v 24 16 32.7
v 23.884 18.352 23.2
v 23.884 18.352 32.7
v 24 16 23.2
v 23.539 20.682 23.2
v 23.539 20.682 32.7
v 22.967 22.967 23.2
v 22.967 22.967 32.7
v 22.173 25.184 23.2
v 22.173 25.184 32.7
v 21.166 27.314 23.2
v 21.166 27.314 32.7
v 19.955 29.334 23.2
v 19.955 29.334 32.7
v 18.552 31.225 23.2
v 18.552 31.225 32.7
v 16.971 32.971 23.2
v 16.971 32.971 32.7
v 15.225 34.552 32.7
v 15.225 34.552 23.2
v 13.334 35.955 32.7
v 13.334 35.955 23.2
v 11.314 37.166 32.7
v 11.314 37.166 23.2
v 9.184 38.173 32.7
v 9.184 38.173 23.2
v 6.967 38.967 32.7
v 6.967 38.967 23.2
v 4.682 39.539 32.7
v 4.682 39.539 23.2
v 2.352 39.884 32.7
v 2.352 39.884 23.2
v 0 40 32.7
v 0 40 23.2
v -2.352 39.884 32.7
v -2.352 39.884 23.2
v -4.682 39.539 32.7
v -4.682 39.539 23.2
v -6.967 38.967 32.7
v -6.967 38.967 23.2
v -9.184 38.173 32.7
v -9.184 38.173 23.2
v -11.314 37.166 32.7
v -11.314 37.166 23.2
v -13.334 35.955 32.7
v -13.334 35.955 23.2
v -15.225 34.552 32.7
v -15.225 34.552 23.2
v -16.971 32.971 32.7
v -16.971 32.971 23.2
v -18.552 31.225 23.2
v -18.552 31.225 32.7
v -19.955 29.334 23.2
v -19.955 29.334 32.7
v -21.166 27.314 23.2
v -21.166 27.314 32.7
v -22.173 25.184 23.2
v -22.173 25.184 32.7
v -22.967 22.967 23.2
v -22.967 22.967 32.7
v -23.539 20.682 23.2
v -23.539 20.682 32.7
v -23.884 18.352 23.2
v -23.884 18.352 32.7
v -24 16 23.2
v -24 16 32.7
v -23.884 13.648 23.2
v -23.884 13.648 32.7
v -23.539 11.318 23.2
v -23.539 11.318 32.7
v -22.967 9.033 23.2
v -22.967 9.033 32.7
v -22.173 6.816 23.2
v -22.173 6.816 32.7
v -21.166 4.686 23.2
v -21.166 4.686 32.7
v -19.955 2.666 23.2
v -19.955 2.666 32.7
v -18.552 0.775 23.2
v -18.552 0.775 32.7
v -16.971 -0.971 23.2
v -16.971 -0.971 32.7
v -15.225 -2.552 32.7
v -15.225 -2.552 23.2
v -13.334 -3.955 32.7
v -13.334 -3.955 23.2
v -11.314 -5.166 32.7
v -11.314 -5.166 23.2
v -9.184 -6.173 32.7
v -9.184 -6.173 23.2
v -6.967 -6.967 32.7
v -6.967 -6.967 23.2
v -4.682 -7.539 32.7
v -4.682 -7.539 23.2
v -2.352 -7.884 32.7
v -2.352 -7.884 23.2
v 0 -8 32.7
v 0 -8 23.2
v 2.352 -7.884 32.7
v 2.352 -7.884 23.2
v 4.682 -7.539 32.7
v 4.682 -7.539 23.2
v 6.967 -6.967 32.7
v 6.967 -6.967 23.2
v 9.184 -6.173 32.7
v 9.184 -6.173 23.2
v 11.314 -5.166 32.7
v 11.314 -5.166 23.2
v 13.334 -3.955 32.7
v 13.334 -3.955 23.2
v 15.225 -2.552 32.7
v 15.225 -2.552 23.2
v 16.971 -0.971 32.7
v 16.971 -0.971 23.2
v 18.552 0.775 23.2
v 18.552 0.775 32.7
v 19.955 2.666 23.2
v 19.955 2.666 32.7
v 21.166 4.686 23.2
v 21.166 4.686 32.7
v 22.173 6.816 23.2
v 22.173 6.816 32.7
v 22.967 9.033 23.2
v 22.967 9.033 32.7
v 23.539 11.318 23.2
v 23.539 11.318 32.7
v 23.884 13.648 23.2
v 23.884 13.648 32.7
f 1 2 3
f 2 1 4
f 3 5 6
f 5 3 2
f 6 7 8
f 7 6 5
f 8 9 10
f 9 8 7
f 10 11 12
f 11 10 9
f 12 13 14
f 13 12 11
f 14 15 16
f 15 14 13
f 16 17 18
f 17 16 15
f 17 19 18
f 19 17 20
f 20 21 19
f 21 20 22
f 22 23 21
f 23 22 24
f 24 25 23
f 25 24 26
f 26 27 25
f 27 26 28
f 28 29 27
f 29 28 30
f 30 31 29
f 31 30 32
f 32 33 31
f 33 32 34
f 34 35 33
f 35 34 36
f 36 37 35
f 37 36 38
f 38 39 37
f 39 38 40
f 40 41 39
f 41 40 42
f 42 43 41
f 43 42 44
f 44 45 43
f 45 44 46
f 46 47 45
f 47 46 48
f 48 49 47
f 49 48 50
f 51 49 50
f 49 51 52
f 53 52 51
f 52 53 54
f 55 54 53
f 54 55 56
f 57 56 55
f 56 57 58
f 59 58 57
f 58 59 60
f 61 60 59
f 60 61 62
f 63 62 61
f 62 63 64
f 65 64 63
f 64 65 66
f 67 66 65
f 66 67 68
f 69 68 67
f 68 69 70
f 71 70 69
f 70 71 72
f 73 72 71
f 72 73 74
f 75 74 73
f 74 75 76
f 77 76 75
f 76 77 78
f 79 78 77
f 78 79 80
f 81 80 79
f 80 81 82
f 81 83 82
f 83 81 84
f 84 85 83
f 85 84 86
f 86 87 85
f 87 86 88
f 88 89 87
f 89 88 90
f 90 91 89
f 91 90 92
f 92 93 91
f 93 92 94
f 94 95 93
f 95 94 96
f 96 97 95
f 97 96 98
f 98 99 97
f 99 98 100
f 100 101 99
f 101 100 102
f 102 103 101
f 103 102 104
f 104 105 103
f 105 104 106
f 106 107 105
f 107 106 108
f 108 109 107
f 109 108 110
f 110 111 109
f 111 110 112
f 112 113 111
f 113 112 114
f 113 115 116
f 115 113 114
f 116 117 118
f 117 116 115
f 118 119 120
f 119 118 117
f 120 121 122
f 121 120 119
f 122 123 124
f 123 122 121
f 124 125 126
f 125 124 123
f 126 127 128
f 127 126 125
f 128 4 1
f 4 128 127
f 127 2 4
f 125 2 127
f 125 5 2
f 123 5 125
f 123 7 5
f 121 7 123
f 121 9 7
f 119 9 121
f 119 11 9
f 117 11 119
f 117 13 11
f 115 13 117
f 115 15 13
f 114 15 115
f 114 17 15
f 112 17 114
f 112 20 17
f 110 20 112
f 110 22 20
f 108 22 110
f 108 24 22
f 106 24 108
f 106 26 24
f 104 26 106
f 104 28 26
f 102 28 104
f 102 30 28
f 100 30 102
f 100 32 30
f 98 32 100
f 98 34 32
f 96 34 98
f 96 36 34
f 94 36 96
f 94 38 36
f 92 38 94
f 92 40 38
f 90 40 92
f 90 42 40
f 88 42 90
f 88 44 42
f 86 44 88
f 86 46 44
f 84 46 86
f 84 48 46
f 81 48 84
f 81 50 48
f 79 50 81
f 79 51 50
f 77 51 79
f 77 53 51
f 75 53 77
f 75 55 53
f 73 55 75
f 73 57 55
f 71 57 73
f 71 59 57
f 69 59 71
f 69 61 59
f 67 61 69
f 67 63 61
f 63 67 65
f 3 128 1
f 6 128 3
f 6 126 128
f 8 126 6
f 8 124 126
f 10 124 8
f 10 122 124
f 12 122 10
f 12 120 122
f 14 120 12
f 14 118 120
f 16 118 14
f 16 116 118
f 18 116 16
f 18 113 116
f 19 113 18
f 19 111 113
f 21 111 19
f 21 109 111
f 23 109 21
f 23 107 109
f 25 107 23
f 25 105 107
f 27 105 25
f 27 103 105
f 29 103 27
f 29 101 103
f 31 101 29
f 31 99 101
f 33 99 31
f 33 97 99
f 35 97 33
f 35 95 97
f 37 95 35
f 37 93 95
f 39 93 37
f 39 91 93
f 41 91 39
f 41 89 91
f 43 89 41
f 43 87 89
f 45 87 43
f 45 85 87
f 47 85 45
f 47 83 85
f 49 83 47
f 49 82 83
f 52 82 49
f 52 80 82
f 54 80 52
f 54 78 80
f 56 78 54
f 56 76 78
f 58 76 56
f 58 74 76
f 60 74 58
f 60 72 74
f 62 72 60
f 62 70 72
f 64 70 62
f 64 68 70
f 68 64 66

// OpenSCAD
// Task 10 seed. The completed source must include 01_kicad_parameters.scad.
$fn = 64;
board_bbox = [82.0, 82.0, 1.2];
package_bbox = [95.4, 95.4, 35.4];
wall_mm = 2.7;
base_mm = 2.7;
lid_mm = 2.7;
tray_outer_top_z = 32.6;
lid_inner_z = 32.7;
board_bottom_z = 16.8;
board_top_z = board_bottom_z + board_bbox[2];
antenna_center = [0.0, 16.0];
antenna_radius = 24.0;
antenna_keepout_z = [23.2, 32.7];

module seed_board_reference() {
  %translate([-board_bbox[0] / 2, -board_bbox[1] / 2, board_bottom_z])
    cube(board_bbox);
}

module seed_lid_reference() {
  %translate([-package_bbox[0] / 2, -package_bbox[1] / 2, lid_inner_z])
    cube([package_bbox[0], package_bbox[1], lid_mm]);
}

module seed_antenna_reserved_volume_reference() {
  #translate([antenna_center[0], antenna_center[1], antenna_keepout_z[0]])
    cylinder(r=antenna_radius, h=antenna_keepout_z[1] - antenna_keepout_z[0]);
}

// Replace these references with the tray, separate lid, bored standoffs,
// J1 side window, and TP1 top bore. A1 remains an internal reserved air
// volume under the nonconductive lid; do not turn it into an aperture.
seed_board_reference();
seed_lid_reference();
seed_antenna_reserved_volume_reference();
